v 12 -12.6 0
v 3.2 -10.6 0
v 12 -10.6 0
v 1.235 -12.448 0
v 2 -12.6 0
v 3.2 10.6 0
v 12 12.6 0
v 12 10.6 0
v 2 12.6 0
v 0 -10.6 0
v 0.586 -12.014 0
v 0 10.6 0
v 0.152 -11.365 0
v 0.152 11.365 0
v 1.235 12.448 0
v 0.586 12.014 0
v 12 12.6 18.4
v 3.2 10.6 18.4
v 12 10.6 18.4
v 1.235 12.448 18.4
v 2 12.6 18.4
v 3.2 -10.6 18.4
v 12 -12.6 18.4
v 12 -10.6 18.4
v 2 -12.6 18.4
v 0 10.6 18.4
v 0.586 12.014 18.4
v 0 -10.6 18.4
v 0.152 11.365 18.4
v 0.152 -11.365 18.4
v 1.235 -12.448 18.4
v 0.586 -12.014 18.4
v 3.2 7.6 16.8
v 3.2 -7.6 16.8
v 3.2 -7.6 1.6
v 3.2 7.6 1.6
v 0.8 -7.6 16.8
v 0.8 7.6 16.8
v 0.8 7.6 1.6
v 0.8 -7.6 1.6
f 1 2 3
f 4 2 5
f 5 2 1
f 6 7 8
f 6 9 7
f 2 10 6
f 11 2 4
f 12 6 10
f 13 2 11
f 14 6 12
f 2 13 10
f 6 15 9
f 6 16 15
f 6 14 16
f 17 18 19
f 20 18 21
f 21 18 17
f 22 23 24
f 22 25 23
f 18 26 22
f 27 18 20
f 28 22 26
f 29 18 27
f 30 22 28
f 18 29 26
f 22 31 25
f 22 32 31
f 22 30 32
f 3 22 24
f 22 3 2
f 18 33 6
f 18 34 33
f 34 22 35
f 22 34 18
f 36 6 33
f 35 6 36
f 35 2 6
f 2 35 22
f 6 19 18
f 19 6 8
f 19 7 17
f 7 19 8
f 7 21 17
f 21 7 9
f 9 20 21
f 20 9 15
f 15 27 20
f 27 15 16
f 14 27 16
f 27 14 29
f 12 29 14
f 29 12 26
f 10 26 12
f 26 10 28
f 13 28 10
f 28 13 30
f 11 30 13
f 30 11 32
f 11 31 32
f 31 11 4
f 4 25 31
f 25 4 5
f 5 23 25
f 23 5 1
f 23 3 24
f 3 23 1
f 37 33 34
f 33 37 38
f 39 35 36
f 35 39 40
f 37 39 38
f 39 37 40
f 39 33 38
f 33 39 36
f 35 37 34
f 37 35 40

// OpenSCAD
LH = 0.28;
DOOR_DEPTH = 21.2;

X1 = 0;
Y1 = 0;

X2 = 12;
Y2 = DOOR_DEPTH / 2;

X3 = X1 + 3.2;
Y3 = Y2 + 2;

R = 2;
MH = 15.2;
PAD = 1.6;
H = MH + PAD * 2;




difference() {
  linear_extrude(H)
    intersection() {
      union() {
        translate([R, -Y3, 0]) 
          square([X2 - R, Y3 * 2]);

        translate([0, -Y3 + R, 0]) 
          square([X2, Y3 * 2 - R * 2]);

        translate([R,-Y3 + R,0])
          circle(R, $fn = 16);
          
        translate([R,Y3 - R,0])
          circle(R, $fn = 16);
      }
      
      polygon([
        // CENTER
        [X1, Y1],
    
        [X1, Y2],          
        [X1, Y3],       
        [X2, Y3],
        [X2, Y2],
        [X3, Y2],
        
        [X3, Y1],

        [X3, -Y2],
        [X2, -Y2],
        [X2, -Y3],       
        [X1, -Y3],
        
        [X1, -Y2]
       ]);
    }
     
  // -1.6
  translate([0.8, -MH / 2, PAD])
    cube([3, MH, MH]);
}
